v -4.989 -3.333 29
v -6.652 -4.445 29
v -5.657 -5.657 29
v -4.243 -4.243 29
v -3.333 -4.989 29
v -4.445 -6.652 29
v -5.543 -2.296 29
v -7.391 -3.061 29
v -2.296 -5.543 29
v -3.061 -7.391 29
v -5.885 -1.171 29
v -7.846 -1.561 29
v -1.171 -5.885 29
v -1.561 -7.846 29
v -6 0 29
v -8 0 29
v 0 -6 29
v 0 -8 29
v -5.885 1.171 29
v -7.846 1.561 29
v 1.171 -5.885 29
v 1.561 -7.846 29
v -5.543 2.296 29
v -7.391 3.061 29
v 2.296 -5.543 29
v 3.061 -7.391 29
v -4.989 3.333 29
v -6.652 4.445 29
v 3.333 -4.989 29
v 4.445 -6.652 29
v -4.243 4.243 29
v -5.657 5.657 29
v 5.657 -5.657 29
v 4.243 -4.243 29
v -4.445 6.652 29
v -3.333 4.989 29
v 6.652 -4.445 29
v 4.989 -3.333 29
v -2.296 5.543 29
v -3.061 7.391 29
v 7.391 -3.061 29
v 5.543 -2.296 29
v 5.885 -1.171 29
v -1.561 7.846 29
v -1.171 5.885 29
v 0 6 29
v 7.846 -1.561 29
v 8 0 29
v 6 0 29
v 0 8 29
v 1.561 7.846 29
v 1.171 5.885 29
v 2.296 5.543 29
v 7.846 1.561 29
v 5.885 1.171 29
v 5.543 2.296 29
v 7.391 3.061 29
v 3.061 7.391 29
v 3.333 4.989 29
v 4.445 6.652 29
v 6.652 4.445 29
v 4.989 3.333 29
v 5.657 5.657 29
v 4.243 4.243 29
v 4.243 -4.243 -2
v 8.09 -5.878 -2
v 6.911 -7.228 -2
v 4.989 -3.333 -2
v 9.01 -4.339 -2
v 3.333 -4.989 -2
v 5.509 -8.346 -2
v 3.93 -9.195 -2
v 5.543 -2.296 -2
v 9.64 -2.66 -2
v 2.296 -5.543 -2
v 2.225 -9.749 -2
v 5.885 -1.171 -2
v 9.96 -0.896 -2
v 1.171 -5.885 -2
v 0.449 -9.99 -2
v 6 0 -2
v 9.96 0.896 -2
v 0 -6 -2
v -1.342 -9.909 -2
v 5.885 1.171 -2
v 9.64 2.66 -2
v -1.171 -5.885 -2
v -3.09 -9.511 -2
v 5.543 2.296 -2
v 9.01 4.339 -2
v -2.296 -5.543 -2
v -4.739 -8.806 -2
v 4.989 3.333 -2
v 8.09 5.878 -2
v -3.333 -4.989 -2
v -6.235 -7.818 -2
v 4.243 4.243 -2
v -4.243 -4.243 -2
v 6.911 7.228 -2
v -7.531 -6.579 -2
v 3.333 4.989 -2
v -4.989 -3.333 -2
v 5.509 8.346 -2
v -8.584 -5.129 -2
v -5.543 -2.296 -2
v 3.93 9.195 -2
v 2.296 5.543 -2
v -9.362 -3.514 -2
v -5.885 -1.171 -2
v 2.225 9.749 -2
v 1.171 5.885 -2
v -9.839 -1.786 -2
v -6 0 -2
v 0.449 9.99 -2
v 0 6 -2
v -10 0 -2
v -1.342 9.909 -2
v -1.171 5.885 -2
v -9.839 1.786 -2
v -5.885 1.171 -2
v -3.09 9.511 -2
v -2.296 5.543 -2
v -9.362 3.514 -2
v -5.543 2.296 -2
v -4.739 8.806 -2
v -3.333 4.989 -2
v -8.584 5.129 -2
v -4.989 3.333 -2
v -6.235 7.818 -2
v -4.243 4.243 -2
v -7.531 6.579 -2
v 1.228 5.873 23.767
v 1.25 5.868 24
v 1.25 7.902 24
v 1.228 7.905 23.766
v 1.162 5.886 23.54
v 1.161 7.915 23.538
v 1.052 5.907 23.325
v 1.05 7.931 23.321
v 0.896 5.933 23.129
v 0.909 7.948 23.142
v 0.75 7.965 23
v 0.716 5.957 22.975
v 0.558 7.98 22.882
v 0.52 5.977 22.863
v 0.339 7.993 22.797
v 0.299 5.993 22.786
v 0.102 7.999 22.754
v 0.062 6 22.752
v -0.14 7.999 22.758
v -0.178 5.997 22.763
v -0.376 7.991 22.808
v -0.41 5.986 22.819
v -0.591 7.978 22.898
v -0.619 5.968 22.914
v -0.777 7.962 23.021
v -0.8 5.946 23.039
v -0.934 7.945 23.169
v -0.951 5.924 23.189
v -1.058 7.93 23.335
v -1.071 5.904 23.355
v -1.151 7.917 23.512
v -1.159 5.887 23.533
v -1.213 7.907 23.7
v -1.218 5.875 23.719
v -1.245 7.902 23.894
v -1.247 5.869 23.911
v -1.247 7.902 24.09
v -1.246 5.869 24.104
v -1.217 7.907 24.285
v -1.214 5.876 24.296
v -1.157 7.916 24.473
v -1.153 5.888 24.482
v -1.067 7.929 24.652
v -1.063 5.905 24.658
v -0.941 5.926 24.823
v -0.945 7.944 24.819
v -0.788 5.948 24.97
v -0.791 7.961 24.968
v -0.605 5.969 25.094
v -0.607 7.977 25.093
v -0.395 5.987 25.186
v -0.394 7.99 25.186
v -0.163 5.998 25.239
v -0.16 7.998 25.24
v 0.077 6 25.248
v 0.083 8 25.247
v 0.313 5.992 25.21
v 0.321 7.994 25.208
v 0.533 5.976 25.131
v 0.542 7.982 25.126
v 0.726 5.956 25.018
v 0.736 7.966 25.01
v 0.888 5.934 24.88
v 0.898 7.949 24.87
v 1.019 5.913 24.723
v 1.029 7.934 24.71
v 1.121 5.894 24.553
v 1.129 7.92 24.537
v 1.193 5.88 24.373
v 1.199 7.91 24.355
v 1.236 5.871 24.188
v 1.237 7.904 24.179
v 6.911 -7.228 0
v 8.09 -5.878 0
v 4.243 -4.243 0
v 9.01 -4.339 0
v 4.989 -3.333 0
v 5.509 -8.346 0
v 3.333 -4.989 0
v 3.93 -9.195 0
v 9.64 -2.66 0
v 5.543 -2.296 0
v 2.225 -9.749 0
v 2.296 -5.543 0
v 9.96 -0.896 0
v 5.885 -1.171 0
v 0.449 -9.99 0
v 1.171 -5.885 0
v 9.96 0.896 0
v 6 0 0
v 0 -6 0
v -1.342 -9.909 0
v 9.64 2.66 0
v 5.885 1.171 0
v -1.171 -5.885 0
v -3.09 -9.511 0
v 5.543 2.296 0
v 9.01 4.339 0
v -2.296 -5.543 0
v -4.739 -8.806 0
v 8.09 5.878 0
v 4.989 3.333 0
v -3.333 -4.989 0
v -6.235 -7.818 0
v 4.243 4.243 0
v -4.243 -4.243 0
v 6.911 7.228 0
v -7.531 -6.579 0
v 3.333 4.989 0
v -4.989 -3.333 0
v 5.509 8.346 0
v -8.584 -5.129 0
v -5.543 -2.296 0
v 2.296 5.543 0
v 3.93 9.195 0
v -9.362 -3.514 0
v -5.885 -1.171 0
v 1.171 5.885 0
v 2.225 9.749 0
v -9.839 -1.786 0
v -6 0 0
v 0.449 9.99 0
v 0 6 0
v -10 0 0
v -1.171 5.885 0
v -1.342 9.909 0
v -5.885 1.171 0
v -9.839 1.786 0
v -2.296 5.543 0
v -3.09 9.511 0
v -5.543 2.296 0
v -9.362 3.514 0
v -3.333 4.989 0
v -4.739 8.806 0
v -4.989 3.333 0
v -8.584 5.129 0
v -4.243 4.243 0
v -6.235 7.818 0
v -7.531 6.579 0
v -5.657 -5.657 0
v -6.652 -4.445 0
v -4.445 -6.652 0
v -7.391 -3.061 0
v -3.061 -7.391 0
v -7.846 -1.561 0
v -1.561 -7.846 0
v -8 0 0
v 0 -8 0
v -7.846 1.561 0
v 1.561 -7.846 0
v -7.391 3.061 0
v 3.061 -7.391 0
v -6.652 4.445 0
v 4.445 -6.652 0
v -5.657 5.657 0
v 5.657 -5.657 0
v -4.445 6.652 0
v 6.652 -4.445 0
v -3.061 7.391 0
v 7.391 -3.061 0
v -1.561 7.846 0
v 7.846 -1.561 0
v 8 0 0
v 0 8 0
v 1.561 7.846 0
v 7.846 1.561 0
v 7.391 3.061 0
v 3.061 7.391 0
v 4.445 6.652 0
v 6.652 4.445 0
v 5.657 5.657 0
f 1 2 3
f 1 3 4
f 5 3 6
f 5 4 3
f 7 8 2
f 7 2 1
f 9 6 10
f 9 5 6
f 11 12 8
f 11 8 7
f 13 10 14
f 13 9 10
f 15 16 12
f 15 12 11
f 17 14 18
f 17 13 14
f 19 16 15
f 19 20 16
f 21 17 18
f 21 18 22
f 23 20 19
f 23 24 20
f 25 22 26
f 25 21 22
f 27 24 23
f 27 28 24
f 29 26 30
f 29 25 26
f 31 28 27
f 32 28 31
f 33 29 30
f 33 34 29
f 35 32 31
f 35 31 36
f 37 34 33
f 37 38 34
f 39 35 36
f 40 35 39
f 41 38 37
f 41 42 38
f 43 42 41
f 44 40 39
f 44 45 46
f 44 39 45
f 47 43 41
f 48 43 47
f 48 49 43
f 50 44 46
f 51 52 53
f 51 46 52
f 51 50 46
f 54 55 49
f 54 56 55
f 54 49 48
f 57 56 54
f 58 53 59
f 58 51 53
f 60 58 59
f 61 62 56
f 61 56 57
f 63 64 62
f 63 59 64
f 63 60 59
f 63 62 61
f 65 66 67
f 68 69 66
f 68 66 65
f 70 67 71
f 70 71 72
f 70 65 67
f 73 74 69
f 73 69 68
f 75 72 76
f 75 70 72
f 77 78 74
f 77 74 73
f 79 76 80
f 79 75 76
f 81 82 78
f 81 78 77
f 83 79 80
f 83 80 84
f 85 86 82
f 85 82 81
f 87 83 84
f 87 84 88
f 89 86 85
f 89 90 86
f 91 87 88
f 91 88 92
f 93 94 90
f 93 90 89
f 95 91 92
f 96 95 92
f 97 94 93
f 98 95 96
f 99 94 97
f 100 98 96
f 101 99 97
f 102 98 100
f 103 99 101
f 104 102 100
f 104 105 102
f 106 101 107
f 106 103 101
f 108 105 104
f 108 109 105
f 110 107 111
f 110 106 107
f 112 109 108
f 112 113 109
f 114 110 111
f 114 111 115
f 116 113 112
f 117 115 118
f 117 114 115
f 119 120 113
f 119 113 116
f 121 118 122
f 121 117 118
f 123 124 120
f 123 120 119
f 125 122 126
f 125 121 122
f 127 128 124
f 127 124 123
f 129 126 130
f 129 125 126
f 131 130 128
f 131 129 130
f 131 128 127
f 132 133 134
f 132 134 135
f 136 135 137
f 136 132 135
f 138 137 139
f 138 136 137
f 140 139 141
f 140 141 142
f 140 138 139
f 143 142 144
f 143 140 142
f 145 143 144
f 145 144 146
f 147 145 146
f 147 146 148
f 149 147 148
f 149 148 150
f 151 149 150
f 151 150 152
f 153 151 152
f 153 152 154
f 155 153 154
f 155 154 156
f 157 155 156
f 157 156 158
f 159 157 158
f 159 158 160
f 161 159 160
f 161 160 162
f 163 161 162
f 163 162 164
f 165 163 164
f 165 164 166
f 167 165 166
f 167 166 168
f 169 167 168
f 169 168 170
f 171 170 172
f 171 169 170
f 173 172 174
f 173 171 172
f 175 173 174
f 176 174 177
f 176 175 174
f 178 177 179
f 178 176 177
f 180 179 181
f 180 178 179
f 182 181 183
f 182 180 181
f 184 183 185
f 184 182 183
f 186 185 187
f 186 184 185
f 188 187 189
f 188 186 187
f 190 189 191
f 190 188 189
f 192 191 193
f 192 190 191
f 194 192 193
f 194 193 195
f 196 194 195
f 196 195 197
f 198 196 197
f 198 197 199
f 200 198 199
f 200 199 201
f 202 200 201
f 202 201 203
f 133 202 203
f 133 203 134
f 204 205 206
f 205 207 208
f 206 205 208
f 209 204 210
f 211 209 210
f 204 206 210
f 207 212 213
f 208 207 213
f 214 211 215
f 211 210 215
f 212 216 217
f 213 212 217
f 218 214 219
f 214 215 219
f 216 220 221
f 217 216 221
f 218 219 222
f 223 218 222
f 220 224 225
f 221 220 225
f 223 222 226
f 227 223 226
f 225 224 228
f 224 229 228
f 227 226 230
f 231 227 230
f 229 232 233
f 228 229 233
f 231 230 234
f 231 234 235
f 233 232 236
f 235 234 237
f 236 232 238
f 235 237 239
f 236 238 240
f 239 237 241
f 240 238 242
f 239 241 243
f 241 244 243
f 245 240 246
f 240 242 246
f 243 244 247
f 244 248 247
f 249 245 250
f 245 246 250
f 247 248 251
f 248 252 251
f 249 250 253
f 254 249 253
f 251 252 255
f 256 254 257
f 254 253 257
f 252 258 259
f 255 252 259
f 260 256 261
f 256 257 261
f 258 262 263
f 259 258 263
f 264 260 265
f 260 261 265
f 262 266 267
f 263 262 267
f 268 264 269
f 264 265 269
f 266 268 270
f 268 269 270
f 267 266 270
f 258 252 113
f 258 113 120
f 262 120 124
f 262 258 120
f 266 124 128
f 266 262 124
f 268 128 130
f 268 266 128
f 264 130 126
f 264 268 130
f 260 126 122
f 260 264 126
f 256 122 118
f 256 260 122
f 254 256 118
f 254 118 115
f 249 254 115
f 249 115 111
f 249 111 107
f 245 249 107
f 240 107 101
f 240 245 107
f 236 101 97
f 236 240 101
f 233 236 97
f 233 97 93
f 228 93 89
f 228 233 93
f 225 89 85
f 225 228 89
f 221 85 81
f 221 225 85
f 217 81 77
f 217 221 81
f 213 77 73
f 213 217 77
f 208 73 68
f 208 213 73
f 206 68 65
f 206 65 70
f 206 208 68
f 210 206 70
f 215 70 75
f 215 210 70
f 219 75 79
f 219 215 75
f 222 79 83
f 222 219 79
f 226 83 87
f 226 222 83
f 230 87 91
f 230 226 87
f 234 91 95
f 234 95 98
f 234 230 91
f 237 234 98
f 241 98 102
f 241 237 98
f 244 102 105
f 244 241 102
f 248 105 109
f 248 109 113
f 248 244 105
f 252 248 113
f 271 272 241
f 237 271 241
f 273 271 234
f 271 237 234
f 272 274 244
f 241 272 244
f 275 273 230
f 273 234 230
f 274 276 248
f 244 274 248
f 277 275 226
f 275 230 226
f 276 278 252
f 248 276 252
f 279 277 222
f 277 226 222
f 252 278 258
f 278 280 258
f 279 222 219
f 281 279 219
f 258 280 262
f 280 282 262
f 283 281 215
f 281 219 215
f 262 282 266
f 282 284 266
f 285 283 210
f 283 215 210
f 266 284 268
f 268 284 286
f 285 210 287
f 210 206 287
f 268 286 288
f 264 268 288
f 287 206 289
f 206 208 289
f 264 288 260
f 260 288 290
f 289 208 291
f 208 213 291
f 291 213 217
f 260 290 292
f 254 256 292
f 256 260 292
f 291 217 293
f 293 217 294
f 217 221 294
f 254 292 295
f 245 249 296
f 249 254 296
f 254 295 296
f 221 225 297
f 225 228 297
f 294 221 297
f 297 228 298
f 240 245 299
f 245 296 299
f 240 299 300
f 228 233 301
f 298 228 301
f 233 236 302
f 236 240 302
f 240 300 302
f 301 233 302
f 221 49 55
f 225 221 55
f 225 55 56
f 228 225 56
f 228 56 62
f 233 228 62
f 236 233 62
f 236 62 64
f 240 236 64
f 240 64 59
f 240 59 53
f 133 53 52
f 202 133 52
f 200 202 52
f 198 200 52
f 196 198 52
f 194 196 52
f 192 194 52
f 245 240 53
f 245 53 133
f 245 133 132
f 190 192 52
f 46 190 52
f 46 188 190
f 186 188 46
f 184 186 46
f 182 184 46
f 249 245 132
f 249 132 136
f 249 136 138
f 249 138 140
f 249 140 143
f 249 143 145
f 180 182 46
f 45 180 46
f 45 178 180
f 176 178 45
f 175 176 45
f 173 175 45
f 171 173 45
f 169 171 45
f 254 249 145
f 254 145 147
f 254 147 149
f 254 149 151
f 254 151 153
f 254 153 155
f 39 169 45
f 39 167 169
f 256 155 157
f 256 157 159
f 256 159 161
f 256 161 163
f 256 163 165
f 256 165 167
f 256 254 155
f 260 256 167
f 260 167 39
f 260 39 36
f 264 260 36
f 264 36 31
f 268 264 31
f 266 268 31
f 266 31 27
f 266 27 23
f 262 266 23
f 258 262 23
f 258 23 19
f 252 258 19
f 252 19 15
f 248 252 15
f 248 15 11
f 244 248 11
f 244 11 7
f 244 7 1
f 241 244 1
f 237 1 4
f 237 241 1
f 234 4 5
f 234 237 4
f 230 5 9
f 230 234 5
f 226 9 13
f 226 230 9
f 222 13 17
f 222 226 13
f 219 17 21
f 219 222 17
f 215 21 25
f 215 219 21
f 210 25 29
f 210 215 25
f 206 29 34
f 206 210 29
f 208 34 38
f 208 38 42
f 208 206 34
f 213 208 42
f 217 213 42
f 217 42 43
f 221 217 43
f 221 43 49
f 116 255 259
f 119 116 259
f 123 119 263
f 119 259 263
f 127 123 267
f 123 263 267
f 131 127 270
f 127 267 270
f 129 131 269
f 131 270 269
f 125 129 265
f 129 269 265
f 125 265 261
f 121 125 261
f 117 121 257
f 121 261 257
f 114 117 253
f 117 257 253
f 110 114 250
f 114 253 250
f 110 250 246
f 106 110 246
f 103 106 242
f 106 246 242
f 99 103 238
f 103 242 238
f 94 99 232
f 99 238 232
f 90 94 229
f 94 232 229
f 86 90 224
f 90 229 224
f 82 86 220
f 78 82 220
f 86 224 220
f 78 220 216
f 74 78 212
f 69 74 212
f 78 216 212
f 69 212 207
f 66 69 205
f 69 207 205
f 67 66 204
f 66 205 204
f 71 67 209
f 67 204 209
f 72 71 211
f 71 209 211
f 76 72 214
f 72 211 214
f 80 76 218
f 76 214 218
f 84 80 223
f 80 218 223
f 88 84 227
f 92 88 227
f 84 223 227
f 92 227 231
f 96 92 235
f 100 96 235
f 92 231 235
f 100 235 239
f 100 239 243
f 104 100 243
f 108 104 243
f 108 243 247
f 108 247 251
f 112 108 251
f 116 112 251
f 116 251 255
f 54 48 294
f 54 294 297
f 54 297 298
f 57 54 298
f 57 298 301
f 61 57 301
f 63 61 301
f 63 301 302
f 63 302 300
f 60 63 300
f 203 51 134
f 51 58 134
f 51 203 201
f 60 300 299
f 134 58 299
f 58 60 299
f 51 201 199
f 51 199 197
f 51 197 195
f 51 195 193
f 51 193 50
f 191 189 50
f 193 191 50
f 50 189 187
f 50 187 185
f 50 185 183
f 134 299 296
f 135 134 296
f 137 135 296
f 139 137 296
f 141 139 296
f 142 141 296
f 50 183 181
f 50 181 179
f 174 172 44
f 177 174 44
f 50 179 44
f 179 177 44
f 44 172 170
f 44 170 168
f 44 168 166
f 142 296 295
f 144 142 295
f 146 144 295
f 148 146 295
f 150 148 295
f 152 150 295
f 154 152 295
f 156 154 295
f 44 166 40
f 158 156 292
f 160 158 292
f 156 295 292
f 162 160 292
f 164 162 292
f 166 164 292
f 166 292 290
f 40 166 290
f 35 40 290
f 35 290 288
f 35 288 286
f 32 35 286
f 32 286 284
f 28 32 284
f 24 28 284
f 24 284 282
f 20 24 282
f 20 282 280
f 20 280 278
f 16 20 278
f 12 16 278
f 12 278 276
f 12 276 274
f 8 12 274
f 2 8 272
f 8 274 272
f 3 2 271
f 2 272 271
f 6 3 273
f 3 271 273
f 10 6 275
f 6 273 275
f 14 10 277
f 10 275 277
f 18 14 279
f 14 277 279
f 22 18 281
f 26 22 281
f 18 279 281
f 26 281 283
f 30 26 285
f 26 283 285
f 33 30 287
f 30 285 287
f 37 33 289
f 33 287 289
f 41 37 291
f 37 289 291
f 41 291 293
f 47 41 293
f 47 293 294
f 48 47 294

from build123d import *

# Parameters (mm, degrees)
SKETCH1_R           = 8
SKETCH1_R_2         = 6
BOSS_EXTRUDE1_DEPTH = 29
SKETCH2_R           = 10
SKETCH2_R_2         = 6
BOSS_EXTRUDE2_DEPTH = 2
SKETCH3_R           = 1.25
CUT_EXTRUDE1_DEPTH  = 11


with BuildPart() as part:
    # Sketch1 → Boss-Extrude1 (new body)
    with BuildSketch(Plane.XY):
        Circle(SKETCH1_R)
        Circle(SKETCH1_R_2, mode=Mode.SUBTRACT)
    extrude(amount=BOSS_EXTRUDE1_DEPTH)

    # Sketch3 → Cut-Extrude1 (cut, through all)
    with BuildSketch(Plane(origin=(0, 0, 0), x_dir=(1, 0, 0), z_dir=(0, 1, 0))):
        with Locations((0, -24)):
            Circle(SKETCH3_R)
    extrude(amount=CUT_EXTRUDE1_DEPTH, mode=Mode.SUBTRACT)


with BuildPart() as body_2:
    # Sketch2 → Boss-Extrude2 (new body)
    with BuildSketch(Plane(origin=(0, 0, 0), x_dir=(-1, 0, 0), z_dir=(0, 0, -1))):
        Circle(SKETCH2_R)
        Circle(SKETCH2_R_2, mode=Mode.SUBTRACT)
    extrude(amount=BOSS_EXTRUDE2_DEPTH)


solid = Compound([part.part, body_2.part])
